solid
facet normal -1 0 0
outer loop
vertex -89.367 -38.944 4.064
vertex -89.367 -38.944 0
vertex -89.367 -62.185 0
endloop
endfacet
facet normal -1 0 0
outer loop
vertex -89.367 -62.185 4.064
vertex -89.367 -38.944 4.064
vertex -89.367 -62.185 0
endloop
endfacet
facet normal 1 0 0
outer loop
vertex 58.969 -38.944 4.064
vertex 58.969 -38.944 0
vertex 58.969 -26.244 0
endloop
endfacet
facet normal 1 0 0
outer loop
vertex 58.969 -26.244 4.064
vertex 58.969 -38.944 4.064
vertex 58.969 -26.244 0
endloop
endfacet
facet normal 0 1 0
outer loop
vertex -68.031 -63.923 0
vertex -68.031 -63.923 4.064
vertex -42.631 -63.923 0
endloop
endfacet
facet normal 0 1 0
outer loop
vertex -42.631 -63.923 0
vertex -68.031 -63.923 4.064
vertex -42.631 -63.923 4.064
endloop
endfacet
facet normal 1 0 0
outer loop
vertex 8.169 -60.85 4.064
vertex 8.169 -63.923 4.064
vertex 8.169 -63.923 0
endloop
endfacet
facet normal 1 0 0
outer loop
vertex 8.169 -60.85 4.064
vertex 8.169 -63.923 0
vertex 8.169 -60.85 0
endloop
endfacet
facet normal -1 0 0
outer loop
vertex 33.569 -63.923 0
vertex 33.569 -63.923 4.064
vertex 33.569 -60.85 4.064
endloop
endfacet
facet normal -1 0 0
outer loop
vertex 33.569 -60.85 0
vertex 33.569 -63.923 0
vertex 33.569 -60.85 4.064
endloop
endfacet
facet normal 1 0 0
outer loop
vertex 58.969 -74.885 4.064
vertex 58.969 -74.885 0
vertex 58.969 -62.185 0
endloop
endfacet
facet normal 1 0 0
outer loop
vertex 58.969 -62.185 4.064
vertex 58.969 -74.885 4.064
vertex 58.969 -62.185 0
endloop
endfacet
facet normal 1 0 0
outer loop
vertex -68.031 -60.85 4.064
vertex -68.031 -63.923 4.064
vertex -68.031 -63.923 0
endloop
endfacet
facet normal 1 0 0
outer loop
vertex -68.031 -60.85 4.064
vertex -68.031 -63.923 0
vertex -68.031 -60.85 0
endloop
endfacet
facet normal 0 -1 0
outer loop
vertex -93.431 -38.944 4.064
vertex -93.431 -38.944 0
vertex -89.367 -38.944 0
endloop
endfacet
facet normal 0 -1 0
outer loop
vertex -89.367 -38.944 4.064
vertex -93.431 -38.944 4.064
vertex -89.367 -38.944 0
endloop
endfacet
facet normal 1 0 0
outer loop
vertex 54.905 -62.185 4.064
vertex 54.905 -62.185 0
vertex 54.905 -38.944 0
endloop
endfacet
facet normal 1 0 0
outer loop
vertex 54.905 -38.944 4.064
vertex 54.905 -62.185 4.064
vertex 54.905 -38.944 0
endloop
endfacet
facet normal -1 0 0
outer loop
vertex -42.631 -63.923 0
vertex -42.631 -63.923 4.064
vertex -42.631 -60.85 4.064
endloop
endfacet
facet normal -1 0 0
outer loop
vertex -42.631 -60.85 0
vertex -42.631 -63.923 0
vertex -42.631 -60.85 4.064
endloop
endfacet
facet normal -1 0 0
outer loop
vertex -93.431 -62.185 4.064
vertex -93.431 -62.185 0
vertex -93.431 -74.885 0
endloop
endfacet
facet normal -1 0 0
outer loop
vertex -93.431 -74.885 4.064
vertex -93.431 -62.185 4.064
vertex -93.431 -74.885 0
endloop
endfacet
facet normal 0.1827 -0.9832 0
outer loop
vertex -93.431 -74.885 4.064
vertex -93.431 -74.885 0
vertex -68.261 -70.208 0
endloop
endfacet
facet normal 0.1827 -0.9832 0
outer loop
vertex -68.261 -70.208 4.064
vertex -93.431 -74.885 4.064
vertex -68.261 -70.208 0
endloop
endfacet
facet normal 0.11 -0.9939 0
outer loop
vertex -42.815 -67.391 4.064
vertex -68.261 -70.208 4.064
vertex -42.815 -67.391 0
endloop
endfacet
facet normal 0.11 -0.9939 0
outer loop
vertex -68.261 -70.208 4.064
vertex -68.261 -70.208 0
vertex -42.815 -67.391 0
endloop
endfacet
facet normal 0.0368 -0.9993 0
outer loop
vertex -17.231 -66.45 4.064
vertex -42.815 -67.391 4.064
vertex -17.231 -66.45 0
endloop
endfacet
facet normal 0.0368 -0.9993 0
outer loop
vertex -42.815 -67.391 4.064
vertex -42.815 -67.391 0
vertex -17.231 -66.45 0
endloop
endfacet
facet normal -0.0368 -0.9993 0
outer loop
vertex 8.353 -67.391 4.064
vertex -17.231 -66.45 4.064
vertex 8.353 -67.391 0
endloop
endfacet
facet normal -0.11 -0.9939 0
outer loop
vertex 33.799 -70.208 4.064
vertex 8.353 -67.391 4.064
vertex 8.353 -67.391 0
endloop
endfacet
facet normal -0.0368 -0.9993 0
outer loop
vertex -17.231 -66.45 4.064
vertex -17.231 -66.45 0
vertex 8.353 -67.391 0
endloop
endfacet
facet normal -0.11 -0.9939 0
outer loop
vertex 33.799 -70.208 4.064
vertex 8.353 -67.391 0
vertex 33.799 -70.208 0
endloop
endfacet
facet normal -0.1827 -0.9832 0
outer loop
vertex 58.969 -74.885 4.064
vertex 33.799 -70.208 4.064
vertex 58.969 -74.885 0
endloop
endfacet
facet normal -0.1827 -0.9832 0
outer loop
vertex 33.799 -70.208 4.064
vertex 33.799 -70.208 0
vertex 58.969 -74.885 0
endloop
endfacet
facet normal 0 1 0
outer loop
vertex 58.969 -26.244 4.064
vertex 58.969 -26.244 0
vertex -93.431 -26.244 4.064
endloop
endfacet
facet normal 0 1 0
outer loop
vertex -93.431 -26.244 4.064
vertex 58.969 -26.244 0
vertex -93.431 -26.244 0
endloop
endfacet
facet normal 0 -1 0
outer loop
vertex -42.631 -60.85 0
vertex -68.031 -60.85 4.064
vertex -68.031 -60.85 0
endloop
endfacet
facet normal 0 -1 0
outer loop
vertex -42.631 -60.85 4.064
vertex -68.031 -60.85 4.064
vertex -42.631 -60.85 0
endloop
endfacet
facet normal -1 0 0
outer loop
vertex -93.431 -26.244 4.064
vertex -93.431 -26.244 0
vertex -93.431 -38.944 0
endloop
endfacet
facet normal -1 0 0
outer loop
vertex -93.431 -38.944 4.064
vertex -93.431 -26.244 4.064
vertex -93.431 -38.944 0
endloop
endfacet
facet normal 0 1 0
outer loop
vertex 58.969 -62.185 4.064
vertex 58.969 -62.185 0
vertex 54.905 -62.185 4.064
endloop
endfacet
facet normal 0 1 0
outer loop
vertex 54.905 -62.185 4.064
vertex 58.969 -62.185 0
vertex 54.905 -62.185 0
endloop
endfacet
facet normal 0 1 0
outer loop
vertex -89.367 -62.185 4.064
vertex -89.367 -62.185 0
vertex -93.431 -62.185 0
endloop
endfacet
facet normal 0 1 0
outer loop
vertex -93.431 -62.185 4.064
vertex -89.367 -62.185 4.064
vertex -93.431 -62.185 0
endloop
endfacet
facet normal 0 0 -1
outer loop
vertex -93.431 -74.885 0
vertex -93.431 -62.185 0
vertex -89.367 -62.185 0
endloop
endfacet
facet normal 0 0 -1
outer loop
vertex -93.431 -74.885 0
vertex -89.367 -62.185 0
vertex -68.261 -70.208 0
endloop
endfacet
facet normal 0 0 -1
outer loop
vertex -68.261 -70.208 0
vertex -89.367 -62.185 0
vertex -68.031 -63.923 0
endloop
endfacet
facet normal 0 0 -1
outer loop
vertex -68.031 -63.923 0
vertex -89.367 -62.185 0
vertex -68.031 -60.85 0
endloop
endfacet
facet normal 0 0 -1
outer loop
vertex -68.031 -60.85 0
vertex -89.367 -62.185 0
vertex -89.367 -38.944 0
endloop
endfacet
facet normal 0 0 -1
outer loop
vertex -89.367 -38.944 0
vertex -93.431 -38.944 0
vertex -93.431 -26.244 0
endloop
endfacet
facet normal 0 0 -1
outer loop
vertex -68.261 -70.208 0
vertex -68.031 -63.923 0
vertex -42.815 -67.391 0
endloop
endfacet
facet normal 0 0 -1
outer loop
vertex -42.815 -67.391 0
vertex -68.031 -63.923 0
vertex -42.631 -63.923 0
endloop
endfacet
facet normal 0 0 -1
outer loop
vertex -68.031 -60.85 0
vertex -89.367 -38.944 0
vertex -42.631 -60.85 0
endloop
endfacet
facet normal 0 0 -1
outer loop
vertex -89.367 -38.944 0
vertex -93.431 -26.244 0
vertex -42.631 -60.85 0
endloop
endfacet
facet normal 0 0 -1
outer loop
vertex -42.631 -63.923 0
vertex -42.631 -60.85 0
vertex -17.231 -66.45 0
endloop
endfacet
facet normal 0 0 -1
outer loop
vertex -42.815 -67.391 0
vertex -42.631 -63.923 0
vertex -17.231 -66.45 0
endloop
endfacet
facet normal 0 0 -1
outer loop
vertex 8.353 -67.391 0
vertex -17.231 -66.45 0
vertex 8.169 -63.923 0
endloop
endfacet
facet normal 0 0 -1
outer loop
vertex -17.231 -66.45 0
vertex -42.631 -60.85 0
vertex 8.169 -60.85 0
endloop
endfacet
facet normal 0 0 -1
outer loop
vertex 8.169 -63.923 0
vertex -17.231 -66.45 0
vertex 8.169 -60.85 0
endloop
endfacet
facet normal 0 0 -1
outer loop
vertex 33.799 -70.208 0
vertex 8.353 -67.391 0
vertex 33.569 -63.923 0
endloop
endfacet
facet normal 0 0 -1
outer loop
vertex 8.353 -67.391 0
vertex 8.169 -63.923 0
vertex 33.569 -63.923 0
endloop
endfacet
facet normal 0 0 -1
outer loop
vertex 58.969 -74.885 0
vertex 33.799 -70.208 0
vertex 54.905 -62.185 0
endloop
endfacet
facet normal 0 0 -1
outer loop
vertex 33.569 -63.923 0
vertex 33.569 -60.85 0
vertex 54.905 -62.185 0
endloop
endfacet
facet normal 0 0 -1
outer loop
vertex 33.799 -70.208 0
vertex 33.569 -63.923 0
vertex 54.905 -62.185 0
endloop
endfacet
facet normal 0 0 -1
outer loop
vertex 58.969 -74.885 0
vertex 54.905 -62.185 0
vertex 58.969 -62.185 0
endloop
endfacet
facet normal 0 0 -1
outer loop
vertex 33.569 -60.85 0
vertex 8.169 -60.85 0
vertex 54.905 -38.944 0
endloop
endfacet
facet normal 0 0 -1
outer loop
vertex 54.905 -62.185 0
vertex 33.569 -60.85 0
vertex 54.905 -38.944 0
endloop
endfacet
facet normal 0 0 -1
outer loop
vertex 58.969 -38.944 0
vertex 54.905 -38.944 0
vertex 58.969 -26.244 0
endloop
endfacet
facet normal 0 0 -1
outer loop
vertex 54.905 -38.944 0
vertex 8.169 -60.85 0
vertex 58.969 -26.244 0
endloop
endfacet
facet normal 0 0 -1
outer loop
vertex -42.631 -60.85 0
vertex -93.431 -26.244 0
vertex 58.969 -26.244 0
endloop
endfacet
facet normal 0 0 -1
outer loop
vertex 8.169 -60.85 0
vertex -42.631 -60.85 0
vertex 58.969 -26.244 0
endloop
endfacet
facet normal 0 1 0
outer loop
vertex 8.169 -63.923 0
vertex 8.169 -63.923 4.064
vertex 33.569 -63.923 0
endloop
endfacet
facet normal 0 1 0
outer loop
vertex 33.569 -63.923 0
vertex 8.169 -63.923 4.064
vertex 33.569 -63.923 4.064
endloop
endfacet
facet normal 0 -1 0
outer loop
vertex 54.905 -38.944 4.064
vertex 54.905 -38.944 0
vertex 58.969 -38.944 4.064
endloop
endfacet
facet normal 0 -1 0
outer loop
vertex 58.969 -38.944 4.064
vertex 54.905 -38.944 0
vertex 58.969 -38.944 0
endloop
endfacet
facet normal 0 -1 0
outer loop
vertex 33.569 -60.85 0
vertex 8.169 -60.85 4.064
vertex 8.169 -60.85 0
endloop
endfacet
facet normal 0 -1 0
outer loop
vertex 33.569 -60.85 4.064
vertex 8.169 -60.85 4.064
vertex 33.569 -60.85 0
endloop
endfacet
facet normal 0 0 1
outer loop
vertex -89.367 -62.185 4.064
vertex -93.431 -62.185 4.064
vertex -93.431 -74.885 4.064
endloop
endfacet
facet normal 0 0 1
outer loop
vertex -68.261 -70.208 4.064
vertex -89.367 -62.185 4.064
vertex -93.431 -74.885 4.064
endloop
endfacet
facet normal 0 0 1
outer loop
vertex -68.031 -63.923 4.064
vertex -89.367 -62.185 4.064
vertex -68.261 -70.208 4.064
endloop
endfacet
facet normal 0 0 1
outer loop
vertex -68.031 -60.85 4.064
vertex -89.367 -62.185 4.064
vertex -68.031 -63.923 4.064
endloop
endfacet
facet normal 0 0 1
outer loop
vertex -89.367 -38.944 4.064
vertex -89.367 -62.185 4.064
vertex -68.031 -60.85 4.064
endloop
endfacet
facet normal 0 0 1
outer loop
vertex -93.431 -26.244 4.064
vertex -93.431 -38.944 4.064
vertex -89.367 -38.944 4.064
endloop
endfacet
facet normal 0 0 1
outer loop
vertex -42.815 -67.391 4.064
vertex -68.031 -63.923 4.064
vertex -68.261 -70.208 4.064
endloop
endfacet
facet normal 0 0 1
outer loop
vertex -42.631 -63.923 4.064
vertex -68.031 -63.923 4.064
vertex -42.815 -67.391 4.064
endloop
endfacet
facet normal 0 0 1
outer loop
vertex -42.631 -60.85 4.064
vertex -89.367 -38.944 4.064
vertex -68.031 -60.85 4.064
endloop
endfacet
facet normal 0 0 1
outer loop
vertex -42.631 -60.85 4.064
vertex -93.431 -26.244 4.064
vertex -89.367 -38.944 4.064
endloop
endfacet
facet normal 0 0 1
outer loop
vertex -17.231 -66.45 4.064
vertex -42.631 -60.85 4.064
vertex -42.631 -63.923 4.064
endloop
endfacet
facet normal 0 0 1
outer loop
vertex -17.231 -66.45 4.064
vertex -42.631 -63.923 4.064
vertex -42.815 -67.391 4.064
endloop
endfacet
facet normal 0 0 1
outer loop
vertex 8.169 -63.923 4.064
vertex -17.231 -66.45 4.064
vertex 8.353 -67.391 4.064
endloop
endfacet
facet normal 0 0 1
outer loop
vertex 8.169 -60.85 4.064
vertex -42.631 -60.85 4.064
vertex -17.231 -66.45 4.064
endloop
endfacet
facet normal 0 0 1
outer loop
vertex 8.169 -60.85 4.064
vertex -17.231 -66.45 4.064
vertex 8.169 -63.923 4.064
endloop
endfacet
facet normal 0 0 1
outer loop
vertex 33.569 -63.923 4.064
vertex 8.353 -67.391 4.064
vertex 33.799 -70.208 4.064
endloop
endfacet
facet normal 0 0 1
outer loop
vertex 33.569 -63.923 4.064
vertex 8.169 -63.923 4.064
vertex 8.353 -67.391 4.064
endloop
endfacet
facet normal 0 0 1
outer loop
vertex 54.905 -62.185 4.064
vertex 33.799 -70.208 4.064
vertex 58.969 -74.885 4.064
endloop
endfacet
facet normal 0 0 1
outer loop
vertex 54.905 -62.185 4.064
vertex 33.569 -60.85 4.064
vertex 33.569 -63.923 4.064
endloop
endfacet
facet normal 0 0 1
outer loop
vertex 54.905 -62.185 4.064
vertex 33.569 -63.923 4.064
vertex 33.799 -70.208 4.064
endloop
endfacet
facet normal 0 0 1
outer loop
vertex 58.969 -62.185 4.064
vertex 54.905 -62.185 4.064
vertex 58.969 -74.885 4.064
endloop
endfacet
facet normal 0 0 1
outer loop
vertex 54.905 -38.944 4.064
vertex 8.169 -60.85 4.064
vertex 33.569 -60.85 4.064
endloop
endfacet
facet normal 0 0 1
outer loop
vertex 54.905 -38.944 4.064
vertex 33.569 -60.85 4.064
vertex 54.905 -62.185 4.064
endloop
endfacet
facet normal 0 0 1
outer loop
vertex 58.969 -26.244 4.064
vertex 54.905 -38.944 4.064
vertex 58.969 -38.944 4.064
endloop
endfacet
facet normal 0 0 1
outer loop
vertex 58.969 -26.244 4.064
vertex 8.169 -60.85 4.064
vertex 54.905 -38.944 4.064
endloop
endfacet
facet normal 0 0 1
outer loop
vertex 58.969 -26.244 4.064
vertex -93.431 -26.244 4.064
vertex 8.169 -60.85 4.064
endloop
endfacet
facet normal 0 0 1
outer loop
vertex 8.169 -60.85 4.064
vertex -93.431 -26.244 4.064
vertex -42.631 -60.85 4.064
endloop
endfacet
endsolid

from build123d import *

# Parameters (mm, degrees)
F1_DEPTH = 4.064
F2_W     = 25.4
F2_H     = 3.0734
F3_DEPTH = 25.4


with BuildPart() as f1:
    # F0 (on Top) → F1 (new body)
    with BuildSketch(Plane.XY):
        with BuildLine():
            Line((-93.431173, -62.185294), (-93.431173, -74.885294))
            ThreePointArc((-93.431173, -74.885294), (-17.231173, -66.45046), (58.968827, -74.885294))
            Line((58.968827, -74.885294), (58.968827, -62.185294))
            Line((58.968827, -62.185294), (54.904827, -62.185294))
            Line((54.904827, -62.185294), (54.904827, -38.944294))
            Line((54.904827, -38.944294), (58.968827, -38.944294))
            Line((58.968827, -38.944294), (58.968827, -36.785294))
            Line((58.968827, -36.785294), (58.968827, -26.244294))
            Line((58.968827, -26.244294), (54.904827, -26.244294))
            Line((54.904827, -26.244294), (-93.431173, -26.244294))
            Line((-93.431173, -26.244294), (-93.431173, -38.944294))
            Line((-93.431173, -38.944294), (-89.367173, -38.944294))
            Line((-89.367173, -38.944294), (-89.367173, -62.185294))
            Line((-89.367173, -62.185294), (-93.431173, -62.185294))
        make_face()
    extrude(amount=F1_DEPTH)

    # F2 (on face) → F3 (cut)
    with BuildSketch(Plane.XY.offset(4.064)):
        with Locations((20.868827, -62.386453)):
            Rectangle(F2_W, F2_H)
        with Locations((-55.331173, -62.386453)):
            Rectangle(F2_W, F2_H)
    extrude(amount=-F3_DEPTH, mode=Mode.SUBTRACT)


solid = f1.part
